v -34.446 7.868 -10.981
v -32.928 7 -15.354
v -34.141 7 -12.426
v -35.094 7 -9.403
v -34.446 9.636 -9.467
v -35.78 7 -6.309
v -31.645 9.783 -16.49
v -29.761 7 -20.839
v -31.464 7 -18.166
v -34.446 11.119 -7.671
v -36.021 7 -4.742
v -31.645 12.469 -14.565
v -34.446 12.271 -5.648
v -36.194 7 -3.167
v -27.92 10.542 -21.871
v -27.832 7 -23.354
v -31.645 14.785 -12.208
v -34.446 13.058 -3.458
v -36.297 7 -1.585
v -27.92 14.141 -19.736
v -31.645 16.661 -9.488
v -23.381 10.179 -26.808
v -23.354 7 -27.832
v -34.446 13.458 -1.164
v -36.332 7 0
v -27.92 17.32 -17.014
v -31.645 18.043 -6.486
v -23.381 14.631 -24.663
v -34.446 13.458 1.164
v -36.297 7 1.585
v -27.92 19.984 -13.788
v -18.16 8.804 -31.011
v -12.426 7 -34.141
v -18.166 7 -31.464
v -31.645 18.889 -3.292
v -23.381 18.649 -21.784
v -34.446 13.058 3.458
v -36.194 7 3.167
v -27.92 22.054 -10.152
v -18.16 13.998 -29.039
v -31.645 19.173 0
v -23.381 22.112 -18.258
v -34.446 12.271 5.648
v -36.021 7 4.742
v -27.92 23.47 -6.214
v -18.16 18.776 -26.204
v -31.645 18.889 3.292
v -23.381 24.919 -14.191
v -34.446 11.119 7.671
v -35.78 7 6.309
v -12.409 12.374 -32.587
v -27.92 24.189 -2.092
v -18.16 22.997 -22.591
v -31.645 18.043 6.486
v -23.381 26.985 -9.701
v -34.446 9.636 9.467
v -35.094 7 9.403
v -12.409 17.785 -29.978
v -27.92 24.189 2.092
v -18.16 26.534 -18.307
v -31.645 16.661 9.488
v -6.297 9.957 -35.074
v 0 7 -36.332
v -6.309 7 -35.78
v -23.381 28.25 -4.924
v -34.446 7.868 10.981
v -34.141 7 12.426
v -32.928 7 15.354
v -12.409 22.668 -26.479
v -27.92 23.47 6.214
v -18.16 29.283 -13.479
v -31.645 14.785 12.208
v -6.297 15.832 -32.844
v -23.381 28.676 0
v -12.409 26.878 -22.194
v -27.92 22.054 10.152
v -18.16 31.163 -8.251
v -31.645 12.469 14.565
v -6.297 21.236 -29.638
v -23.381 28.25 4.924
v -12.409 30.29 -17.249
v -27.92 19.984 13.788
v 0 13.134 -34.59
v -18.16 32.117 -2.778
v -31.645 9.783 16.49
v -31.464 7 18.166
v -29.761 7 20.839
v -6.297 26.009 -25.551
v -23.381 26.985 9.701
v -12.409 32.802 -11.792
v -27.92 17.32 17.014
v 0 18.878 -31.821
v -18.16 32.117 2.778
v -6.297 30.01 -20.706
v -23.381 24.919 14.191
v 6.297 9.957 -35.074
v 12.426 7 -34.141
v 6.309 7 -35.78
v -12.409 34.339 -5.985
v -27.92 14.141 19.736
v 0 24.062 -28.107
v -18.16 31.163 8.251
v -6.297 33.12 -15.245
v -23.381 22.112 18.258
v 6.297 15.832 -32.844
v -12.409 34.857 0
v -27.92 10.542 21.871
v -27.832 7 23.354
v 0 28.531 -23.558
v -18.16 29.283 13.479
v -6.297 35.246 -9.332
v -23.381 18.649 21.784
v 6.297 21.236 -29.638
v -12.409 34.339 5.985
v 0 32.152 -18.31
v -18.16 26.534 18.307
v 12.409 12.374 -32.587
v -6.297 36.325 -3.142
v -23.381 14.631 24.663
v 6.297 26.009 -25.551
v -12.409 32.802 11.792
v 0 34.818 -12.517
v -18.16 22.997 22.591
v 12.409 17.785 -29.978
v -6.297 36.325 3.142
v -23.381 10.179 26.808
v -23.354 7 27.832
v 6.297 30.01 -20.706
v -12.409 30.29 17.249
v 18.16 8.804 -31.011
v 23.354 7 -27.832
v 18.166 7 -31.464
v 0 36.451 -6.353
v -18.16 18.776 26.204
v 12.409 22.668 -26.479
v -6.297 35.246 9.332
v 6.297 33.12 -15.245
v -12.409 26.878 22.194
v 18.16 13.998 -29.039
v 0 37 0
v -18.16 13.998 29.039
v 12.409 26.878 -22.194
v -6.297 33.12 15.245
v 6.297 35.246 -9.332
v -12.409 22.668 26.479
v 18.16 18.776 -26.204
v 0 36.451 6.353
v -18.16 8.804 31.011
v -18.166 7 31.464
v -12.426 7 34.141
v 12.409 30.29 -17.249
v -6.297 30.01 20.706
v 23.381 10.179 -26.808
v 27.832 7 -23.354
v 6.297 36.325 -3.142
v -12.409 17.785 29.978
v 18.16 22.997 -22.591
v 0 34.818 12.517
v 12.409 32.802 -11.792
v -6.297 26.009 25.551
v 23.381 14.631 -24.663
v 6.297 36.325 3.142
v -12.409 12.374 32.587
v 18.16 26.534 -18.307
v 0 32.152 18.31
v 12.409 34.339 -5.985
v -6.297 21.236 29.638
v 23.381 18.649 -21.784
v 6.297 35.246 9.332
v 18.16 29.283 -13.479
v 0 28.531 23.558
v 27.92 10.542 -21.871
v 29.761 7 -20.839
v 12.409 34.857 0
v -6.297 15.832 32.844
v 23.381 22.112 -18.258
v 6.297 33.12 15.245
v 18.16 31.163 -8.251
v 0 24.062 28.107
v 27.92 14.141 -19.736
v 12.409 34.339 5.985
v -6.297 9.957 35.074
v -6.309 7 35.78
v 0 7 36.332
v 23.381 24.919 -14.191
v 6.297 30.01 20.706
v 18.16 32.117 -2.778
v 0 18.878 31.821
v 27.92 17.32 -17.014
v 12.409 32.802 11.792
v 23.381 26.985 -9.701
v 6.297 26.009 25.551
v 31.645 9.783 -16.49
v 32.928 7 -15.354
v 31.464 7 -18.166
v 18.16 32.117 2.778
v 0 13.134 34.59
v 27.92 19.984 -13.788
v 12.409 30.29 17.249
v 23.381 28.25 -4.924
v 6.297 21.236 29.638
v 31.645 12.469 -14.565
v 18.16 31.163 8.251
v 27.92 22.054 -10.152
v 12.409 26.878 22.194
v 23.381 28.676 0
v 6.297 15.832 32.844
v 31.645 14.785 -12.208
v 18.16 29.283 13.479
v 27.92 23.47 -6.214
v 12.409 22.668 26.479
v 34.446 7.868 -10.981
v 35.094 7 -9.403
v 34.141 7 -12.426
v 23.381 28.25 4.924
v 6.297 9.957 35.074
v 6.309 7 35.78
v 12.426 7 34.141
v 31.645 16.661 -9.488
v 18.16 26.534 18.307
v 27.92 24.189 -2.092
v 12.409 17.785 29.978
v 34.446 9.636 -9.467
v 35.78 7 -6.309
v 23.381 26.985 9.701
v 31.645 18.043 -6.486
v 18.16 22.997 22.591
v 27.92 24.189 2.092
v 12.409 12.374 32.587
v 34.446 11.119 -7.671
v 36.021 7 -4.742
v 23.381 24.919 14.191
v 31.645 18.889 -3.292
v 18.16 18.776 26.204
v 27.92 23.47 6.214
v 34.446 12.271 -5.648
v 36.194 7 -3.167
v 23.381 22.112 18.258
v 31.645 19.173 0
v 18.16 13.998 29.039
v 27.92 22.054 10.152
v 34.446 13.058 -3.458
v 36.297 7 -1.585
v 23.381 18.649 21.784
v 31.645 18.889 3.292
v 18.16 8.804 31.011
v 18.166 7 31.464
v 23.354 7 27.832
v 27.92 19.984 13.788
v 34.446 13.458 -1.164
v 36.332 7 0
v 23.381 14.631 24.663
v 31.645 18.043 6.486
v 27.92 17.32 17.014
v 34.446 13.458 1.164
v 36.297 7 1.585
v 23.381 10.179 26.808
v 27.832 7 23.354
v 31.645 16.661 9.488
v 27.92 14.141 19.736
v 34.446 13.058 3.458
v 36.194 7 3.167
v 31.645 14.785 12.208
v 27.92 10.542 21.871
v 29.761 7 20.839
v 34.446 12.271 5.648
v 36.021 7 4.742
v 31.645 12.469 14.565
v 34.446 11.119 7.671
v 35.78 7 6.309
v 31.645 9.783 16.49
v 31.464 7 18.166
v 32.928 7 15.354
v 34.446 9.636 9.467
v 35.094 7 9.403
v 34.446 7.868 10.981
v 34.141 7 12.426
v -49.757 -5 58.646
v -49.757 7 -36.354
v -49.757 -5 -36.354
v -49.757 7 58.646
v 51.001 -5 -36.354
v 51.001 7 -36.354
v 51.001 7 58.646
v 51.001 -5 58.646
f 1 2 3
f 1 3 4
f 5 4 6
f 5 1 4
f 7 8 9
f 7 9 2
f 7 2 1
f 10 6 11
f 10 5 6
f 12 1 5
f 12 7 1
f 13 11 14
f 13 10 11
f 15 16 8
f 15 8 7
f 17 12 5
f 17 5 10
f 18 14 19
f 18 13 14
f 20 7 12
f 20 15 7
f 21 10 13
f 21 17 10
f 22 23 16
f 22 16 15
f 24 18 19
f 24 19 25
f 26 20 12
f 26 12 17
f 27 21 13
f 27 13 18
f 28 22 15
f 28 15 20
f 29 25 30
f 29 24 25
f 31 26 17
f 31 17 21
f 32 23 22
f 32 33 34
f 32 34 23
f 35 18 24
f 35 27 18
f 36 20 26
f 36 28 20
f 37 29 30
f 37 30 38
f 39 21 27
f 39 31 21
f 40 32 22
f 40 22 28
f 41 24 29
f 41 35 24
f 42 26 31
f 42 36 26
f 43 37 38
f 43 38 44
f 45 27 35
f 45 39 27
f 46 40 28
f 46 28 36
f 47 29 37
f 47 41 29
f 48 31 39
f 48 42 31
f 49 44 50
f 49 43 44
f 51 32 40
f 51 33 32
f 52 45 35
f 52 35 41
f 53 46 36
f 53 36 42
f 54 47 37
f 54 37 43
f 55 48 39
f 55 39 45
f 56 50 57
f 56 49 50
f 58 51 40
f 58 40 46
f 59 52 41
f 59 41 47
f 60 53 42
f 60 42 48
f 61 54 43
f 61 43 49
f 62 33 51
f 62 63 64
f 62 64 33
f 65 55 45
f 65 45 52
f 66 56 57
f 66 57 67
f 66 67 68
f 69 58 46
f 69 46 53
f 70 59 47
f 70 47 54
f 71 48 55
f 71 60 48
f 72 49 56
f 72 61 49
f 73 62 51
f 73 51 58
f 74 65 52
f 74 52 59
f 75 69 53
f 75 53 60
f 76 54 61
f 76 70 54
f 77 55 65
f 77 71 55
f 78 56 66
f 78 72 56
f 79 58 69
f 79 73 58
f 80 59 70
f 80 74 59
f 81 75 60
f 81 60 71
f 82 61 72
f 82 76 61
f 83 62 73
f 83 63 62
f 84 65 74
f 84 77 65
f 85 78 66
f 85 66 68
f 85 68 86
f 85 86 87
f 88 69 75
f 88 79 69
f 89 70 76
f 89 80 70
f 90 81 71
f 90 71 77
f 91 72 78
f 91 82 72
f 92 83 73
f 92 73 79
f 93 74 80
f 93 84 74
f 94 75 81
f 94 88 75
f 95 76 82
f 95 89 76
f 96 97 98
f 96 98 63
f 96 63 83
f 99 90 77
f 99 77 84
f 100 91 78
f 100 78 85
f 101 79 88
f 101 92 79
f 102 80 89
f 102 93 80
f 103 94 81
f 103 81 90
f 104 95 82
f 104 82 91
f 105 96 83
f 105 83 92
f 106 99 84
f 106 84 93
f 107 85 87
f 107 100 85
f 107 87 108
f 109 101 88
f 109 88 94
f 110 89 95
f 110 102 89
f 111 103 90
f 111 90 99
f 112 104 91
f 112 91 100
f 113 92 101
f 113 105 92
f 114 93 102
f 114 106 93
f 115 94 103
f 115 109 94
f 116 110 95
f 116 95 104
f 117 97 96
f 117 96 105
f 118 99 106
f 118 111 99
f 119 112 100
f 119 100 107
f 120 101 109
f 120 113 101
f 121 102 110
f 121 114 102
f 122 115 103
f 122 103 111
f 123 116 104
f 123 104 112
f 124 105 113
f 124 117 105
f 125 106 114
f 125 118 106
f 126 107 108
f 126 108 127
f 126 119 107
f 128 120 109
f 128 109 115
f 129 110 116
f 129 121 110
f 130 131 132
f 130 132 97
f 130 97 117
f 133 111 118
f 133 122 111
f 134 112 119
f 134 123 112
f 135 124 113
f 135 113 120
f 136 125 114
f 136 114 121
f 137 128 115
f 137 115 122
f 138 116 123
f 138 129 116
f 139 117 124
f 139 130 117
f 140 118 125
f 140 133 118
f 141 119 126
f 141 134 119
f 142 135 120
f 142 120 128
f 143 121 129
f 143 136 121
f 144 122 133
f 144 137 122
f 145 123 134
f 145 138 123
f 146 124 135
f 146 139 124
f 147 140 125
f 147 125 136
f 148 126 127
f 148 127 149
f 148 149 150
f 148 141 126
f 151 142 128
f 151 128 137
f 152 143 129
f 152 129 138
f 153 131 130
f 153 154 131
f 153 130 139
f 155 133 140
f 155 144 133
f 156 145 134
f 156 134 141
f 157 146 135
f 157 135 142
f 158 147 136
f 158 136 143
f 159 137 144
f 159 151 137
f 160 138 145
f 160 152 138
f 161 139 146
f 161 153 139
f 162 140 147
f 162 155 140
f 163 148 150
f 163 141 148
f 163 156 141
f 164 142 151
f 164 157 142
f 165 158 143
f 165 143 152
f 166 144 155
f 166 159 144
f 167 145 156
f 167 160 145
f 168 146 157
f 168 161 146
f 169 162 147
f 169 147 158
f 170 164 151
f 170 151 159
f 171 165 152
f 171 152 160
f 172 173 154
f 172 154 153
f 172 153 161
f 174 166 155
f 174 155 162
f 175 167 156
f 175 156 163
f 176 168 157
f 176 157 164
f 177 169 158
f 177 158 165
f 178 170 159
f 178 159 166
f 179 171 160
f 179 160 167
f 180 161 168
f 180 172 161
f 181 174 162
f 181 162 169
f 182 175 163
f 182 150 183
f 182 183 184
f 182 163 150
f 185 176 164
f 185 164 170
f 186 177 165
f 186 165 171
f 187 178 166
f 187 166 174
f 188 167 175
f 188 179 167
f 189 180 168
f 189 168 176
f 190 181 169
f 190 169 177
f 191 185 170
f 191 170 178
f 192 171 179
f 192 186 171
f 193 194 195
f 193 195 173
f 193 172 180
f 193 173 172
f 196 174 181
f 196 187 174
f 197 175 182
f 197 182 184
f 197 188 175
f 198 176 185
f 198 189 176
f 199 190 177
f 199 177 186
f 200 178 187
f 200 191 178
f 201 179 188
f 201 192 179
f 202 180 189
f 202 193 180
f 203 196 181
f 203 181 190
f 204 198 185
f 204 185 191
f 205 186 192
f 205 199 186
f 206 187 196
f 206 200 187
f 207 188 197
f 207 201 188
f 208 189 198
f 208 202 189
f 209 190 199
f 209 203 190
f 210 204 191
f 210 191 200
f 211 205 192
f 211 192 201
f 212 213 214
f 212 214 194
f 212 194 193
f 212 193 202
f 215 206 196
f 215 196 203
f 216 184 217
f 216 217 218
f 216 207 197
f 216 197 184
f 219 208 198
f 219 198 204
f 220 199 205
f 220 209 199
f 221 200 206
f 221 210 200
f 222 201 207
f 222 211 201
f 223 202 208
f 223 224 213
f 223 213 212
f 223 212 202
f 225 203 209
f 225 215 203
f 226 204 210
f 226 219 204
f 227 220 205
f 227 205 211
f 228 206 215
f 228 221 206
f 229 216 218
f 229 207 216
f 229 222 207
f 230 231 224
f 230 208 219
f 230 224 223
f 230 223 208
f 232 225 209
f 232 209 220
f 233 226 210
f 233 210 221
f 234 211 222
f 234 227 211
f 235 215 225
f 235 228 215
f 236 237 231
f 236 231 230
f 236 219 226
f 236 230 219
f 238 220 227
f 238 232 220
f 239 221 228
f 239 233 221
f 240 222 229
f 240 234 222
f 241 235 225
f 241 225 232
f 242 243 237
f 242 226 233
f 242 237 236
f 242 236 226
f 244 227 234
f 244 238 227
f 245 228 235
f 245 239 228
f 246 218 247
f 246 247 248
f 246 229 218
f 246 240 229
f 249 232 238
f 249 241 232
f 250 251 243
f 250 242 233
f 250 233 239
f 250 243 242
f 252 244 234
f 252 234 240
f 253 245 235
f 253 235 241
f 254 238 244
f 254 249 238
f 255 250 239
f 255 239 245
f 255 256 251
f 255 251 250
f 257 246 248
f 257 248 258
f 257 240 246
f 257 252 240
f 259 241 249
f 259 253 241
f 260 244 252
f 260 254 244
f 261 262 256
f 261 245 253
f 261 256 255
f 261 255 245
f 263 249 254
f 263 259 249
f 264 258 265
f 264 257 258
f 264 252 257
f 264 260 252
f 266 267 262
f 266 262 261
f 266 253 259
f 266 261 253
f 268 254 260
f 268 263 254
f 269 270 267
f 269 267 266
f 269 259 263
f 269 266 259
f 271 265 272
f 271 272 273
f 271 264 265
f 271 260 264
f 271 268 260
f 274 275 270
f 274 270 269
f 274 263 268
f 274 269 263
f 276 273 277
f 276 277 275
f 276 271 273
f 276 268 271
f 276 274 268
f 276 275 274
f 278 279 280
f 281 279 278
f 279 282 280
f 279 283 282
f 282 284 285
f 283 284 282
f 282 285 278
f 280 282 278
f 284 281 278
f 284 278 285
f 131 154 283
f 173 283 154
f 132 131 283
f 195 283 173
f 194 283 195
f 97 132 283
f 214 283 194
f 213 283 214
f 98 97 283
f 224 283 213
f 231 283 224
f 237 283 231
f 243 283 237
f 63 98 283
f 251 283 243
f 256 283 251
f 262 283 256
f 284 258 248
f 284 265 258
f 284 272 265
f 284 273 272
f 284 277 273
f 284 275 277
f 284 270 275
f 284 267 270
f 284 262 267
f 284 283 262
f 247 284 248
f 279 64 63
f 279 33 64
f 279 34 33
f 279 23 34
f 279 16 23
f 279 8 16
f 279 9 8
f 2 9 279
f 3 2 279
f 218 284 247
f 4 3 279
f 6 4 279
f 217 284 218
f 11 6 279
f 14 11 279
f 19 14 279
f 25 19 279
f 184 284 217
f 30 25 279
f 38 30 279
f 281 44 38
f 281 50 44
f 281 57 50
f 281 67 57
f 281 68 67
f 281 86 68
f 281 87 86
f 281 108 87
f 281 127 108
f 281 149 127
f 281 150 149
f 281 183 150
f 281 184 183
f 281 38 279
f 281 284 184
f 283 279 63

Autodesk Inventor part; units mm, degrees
ref_plane "YZ Plane" through (0, 0, 0) normal (1, 0, 0) x (0, 1, 0)
ref_plane "XY Plane" through (0, 0, 0) normal (0, 0, 1) x (1, 0, 0)
sketch "Эскиз1" plane through (0, 0, 0) normal (0, 1, 0) x (-1, 0, 0)
  arc A0 (37, 0) -> (-37, 0) centre (0, 0) ccw
  line L0 (37, 0) -> (-37, 0)
  dimension "d0" = 37
revolve "Вращение1" add sketch "Эскиз1" angle 360 about axis through (-37, 0, 0) along (1, 0, 0)
ref_plane "РабПлоскость2" through (0, 7, 0) normal (0, 1, 0) x (-1, 0, 0)
ref_plane "РабПлоскость1" through (0, 37, 0) normal (0, 1, 0) x (-1, 0, 0)
sketch "Эскиз3" plane through (0, 0, 0) normal (1, 0, 0) x (0, 1, 0)
  circle A0 centre (0, 0) radius 37 projected
  line L0 (6.4, -36.4423) -> (6.4, -33.4423)
  line L1 (7.6, -36.211) -> (7.6, -33.4423)
  line L2 (6.4, -33.4423) -> (7.6, -33.4423)
  line L3 (7, 51.8) -> (7, -51.8) projected
  point P0 (7, -33.4423)
  dimension "d3" = 3
  dimension "d4" = 1.2
sketch "Эскиз4" plane through (0, 7, 0) normal (0, 1, 0) x (-1, 0, 0)
  circle A0 centre (0, 0) radius 37.054
extrude "Выдавливание1" cut sketch "Эскиз4" against normal blind 54.75
sketch "Эскиз5" plane through (0, 7, 0) normal (0, 1, 0) x (-1, 0, 0)
  line L0 (-51.001, -36.3535) -> (49.7571, -36.3535)
  line L1 (49.7571, -36.3535) -> (49.7571, 58.6465)
  line L2 (49.7571, 58.6465) -> (-51.001, 58.6465)
  line L3 (-51.001, 58.6465) -> (-51.001, -36.3535)
  point P0 (0, 0)
  dimension "d9" = 95
extrude "Выдавливание2" add sketch "Эскиз5" against normal blind 12
properties part number "ball_2"
